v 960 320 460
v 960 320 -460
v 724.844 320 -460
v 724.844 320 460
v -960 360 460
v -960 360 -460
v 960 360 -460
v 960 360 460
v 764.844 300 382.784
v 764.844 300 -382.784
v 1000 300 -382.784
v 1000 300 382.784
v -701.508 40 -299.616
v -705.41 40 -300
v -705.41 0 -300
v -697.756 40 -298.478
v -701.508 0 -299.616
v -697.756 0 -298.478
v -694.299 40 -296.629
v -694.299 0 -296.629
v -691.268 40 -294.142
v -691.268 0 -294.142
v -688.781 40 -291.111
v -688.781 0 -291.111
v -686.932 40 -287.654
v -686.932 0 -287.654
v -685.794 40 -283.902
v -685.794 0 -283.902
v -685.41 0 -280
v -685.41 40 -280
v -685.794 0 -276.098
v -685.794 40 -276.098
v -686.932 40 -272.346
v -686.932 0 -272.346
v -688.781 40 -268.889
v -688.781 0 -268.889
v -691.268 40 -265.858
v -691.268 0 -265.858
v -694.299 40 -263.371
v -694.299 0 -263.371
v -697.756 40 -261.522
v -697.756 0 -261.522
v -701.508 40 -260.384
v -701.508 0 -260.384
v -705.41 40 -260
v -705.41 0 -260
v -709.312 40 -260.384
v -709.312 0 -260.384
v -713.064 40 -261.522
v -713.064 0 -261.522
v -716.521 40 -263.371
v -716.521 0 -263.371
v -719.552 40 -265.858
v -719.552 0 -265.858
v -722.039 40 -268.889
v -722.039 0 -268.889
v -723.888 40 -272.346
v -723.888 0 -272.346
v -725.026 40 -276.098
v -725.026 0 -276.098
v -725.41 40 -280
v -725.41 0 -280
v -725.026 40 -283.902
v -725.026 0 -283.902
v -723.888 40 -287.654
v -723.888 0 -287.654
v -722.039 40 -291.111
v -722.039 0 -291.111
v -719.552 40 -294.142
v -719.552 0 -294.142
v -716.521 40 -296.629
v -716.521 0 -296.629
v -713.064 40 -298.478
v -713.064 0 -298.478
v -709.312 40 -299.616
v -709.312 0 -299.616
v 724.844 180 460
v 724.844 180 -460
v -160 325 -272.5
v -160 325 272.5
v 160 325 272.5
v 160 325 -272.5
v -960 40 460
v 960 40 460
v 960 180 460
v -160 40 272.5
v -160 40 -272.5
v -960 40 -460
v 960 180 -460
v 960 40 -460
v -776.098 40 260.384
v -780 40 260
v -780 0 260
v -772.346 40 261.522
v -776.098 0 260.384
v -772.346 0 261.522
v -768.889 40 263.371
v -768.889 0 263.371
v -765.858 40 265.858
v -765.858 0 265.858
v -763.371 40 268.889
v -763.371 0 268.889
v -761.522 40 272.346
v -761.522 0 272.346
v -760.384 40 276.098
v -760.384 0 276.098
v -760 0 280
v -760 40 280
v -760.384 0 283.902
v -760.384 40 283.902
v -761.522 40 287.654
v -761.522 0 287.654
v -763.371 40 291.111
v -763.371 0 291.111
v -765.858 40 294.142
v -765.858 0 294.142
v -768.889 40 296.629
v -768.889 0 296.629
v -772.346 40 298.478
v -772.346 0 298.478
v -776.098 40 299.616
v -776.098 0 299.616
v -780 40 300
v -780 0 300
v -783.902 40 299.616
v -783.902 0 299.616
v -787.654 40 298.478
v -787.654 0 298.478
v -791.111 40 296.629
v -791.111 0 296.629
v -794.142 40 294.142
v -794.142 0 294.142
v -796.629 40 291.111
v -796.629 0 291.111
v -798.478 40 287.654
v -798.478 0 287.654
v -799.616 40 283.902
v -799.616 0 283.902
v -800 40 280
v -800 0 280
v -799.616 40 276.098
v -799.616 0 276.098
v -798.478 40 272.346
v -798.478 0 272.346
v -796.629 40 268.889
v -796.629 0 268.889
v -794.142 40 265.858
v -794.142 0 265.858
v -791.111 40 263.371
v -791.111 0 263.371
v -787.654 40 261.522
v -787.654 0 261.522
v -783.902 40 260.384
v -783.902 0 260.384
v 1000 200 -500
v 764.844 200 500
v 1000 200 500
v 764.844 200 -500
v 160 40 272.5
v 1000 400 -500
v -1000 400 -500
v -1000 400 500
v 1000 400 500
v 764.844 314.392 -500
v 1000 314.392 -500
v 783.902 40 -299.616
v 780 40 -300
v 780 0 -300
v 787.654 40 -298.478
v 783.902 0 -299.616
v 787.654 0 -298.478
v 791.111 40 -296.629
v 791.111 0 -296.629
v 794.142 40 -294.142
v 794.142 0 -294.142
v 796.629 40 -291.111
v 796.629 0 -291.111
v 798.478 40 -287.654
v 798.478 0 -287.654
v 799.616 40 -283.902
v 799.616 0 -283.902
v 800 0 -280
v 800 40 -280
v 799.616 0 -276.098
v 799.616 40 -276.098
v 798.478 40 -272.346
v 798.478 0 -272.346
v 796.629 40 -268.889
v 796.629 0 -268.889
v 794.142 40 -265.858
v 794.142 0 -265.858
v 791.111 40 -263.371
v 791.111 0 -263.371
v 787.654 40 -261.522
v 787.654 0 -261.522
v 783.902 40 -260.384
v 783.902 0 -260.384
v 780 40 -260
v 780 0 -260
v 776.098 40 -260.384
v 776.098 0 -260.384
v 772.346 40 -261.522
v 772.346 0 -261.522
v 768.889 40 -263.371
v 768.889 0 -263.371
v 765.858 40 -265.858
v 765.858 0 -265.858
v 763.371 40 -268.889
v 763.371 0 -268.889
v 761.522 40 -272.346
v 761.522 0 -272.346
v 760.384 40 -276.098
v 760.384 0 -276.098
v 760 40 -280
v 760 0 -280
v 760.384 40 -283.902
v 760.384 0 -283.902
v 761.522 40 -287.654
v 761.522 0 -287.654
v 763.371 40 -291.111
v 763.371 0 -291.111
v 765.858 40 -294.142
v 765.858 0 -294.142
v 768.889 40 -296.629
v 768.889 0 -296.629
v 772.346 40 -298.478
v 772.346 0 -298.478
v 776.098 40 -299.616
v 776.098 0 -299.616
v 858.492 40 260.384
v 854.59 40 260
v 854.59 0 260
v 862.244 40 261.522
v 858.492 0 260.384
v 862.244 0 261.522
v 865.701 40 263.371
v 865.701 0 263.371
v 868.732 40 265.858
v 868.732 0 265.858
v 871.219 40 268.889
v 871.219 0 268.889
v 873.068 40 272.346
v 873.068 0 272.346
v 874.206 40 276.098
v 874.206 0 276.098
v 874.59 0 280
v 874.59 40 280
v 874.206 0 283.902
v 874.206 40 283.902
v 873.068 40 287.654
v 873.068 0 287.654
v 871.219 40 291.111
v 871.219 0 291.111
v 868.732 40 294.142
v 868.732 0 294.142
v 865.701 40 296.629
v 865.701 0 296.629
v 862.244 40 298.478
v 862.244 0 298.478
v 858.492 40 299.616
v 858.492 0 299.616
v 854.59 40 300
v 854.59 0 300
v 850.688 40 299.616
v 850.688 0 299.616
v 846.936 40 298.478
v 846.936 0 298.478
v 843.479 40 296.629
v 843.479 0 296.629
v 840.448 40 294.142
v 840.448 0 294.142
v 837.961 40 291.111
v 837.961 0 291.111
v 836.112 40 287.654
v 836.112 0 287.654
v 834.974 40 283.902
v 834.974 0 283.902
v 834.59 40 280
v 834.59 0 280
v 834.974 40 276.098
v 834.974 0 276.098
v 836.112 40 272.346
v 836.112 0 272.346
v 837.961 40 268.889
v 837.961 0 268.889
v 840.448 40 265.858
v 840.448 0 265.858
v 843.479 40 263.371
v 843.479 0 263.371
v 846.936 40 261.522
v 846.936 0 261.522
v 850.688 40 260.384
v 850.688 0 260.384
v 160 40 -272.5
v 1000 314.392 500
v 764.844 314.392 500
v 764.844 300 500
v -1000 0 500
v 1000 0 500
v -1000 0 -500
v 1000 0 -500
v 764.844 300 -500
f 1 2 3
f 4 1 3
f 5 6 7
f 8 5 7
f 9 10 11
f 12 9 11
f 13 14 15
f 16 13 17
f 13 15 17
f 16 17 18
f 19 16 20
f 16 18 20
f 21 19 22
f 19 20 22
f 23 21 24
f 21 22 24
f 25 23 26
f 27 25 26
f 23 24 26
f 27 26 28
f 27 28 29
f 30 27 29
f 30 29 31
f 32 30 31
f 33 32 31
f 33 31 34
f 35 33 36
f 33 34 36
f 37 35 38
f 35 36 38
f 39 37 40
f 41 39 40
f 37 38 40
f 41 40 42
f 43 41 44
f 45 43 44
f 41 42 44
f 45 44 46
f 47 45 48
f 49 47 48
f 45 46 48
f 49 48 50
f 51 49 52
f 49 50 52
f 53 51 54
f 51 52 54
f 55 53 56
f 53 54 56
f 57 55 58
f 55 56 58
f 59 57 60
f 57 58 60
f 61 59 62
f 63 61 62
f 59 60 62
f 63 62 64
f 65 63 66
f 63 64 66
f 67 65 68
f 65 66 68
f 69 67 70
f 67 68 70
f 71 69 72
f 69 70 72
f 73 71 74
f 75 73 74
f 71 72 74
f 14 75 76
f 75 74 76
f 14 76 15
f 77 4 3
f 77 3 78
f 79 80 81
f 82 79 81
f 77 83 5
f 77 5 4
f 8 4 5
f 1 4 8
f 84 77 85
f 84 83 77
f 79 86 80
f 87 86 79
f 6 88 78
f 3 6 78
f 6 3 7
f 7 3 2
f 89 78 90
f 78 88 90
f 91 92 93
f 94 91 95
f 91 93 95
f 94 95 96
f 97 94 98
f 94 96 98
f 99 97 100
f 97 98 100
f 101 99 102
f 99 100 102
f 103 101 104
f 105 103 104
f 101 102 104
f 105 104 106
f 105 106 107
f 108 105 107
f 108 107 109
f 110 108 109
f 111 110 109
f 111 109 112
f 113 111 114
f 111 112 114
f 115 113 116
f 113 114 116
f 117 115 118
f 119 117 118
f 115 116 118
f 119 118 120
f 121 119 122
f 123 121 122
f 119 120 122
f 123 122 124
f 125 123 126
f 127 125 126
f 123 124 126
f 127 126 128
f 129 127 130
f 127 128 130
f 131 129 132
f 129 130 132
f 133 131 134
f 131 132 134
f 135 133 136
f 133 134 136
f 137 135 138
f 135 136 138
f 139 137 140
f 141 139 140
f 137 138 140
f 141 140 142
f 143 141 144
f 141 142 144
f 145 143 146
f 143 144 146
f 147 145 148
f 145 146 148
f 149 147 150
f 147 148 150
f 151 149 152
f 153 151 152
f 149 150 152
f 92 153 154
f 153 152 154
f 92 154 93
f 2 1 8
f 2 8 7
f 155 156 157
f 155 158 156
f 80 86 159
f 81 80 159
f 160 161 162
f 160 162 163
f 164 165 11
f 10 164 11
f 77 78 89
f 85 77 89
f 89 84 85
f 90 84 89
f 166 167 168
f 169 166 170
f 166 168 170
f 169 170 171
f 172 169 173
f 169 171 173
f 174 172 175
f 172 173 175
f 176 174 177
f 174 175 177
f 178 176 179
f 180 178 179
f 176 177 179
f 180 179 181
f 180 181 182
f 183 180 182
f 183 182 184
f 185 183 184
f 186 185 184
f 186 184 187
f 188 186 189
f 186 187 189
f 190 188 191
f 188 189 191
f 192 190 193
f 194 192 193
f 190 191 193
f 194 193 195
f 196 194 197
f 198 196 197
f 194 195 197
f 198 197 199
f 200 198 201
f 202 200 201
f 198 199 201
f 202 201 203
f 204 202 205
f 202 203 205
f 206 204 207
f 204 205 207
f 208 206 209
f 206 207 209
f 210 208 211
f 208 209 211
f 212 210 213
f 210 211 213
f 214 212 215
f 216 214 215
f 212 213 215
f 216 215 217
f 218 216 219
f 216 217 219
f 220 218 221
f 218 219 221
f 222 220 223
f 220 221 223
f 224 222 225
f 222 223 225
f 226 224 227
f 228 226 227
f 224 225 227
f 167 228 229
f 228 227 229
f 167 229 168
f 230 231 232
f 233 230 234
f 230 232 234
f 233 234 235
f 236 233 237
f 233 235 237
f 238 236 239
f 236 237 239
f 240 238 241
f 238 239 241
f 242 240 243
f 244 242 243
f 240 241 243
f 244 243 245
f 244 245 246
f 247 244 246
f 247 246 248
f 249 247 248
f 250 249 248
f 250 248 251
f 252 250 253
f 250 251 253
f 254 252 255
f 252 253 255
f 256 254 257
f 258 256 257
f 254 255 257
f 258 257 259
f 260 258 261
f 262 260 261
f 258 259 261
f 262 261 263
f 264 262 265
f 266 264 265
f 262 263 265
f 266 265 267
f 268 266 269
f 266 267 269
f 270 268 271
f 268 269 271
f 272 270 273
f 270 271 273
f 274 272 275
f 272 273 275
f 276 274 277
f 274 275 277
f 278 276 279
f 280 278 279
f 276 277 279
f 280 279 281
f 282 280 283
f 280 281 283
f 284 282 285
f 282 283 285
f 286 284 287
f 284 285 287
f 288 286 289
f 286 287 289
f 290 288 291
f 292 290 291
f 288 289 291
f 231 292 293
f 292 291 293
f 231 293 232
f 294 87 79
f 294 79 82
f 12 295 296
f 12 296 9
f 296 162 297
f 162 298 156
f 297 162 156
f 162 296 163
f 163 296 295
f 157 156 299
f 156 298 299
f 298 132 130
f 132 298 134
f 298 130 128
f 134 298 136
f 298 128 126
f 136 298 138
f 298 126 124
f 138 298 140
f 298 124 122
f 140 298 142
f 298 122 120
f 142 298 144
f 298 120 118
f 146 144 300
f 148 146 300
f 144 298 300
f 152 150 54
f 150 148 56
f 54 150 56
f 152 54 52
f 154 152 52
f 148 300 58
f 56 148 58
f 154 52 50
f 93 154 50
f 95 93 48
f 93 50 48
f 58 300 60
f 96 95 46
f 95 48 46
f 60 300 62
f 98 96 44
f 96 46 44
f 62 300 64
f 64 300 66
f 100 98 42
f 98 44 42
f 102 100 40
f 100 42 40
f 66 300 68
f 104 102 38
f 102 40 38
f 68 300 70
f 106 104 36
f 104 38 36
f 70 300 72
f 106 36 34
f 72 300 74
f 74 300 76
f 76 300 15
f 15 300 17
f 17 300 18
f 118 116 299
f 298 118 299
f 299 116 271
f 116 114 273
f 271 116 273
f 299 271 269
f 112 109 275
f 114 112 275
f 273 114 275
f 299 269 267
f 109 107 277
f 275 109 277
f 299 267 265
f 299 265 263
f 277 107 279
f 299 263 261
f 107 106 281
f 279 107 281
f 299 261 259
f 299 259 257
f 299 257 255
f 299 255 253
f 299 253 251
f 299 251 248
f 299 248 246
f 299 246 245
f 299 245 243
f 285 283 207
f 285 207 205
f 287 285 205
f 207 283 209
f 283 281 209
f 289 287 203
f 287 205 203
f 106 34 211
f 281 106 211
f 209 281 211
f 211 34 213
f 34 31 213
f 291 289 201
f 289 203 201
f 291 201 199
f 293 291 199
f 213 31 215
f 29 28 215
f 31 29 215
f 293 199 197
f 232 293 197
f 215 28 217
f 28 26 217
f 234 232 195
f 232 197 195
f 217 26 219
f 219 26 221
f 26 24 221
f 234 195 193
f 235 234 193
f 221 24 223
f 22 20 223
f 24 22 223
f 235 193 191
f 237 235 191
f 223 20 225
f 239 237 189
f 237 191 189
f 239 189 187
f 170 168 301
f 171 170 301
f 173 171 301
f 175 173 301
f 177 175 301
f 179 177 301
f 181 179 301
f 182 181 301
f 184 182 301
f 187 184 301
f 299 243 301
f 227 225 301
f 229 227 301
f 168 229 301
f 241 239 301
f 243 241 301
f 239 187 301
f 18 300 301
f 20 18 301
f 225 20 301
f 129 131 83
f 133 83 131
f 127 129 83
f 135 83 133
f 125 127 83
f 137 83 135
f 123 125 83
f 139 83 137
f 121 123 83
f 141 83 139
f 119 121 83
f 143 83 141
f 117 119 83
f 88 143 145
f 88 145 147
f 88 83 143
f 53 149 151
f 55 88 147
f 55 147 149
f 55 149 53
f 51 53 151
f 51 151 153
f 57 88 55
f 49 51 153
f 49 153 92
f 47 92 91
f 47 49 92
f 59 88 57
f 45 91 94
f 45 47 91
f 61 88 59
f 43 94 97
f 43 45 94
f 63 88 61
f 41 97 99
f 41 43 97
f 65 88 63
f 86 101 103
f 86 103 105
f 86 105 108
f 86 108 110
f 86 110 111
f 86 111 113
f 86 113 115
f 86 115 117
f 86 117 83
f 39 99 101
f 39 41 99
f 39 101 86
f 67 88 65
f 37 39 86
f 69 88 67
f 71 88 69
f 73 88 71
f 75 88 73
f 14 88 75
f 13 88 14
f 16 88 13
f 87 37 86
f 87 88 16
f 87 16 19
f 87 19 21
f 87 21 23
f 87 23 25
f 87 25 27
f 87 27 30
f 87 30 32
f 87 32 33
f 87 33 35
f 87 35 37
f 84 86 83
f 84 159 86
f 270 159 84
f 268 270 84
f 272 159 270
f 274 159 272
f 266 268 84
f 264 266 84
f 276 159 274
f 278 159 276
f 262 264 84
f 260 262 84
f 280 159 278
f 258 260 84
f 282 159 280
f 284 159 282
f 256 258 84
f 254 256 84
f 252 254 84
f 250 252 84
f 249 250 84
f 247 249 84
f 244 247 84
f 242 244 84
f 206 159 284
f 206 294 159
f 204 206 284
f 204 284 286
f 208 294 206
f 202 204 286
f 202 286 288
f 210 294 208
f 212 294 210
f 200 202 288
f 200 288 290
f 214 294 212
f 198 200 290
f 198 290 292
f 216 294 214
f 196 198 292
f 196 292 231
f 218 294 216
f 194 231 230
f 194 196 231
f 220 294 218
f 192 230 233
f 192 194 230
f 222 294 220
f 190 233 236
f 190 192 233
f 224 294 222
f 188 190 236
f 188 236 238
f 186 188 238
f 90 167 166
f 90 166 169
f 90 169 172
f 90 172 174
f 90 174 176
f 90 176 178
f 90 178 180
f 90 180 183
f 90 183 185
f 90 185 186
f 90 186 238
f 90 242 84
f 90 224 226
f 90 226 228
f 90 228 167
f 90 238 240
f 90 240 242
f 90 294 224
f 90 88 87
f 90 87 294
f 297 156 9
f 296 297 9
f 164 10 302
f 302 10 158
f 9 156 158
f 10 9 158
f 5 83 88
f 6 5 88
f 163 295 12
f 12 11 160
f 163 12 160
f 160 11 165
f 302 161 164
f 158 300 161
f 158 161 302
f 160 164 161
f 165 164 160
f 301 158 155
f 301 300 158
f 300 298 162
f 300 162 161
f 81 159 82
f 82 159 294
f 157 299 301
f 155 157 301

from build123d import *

# Parameters (mm, degrees)
SCHIZZO2_W                   = 2000
SCHIZZO2_H                   = 1000
ESTRUSIONE_ESTRUSIONE1_DEPTH = 400
SVUOTA1_T                    = 40
SCHIZZO3_W                   = 320
SCHIZZO3_H                   = 545
ESTRUSIONE_ESTRUSIONE2_DEPTH = 285
SCHIZZO5_R                   = 20
TAGLIO_ESTRUSIONE1_DEPTH     = 40
SCHIZZO7_W                   = 235.156084519
SCHIZZO7_H                   = 1000
TAGLIO_ESTRUSIONE2_DEPTH     = 100
ESTRUSIONE_ESTRUSIONE4_DEPTH = 920
TAGLIO_ESTRUSIONE3_DEPTH     = 235.156084519


with BuildPart() as part:
    # Schizzo2 → Estrusione-Estrusione1 (new body)
    with BuildSketch(Plane(origin=(0, 0, 0), x_dir=(1, 0, 0), z_dir=(0, 1, 0))):
        Rectangle(SCHIZZO2_W, SCHIZZO2_H)
    extrude(amount=ESTRUSIONE_ESTRUSIONE1_DEPTH)

    # Svuota1 (no face opened: a closed hollow body)
    add(offset(amount=-SVUOTA1_T, mode=Mode.PRIVATE), mode=Mode.SUBTRACT)

    # Schizzo3 → Estrusione-Estrusione2 (add)
    with BuildSketch(Plane(origin=(0, 40, 0), x_dir=(1, 0, 0), z_dir=(0, 1, 0))):
        Rectangle(SCHIZZO3_W, SCHIZZO3_H)
    extrude(amount=ESTRUSIONE_ESTRUSIONE2_DEPTH)

    # Schizzo5 → Taglio-Estrusione1 (cut)
    with BuildSketch(Plane.XZ):
        with Locations(Location((-780, 280, 0), (0, 0, 270))):
            Circle(SCHIZZO5_R)
        with Locations(Location((780, -280, 0), (0, 0, 270))):
            Circle(SCHIZZO5_R)
        with Locations(Location((854.59, 280, 0), (0, 0, 270))):
            Circle(SCHIZZO5_R)
        with Locations(Location((-705.41, -280, 0), (0, 0, 270))):
            Circle(SCHIZZO5_R)
    extrude(amount=-TAGLIO_ESTRUSIONE1_DEPTH, mode=Mode.SUBTRACT)

    # Schizzo7 → Taglio-Estrusione2 (cut)
    with BuildSketch(Plane(origin=(0, 200, 0), x_dir=(1, 0, 0), z_dir=(0, 1, 0))):
        with Locations((882.421957741, 0)):
            Rectangle(SCHIZZO7_W, SCHIZZO7_H)
    extrude(amount=TAGLIO_ESTRUSIONE2_DEPTH, mode=Mode.SUBTRACT)

    # Schizzo8 → Estrusione-Estrusione4 (add)
    with BuildSketch(Plane.XY.offset(-460)):
        Polygon((960, 320), (724.843915481, 320), (724.843915481, 180), (960, 180), (960, 200), (764.843915481, 200), (764.843915481, 300), (960, 300), align=None)
    extrude(amount=ESTRUSIONE_ESTRUSIONE4_DEPTH)

    # Schizzo9 → Taglio-Estrusione3 (cut)
    with BuildSketch(Plane(origin=(1000, 0, 0), x_dir=(0, 0, -1), z_dir=(1, 0, 0))):
        Polygon((-500, 300), (-500, 314.392280451), (-382.784282115, 300), align=None)
        Polygon((382.784282115, 300), (500, 300), (500, 314.392280451), align=None)
    extrude(amount=-TAGLIO_ESTRUSIONE3_DEPTH, mode=Mode.SUBTRACT)


solid = part.part
